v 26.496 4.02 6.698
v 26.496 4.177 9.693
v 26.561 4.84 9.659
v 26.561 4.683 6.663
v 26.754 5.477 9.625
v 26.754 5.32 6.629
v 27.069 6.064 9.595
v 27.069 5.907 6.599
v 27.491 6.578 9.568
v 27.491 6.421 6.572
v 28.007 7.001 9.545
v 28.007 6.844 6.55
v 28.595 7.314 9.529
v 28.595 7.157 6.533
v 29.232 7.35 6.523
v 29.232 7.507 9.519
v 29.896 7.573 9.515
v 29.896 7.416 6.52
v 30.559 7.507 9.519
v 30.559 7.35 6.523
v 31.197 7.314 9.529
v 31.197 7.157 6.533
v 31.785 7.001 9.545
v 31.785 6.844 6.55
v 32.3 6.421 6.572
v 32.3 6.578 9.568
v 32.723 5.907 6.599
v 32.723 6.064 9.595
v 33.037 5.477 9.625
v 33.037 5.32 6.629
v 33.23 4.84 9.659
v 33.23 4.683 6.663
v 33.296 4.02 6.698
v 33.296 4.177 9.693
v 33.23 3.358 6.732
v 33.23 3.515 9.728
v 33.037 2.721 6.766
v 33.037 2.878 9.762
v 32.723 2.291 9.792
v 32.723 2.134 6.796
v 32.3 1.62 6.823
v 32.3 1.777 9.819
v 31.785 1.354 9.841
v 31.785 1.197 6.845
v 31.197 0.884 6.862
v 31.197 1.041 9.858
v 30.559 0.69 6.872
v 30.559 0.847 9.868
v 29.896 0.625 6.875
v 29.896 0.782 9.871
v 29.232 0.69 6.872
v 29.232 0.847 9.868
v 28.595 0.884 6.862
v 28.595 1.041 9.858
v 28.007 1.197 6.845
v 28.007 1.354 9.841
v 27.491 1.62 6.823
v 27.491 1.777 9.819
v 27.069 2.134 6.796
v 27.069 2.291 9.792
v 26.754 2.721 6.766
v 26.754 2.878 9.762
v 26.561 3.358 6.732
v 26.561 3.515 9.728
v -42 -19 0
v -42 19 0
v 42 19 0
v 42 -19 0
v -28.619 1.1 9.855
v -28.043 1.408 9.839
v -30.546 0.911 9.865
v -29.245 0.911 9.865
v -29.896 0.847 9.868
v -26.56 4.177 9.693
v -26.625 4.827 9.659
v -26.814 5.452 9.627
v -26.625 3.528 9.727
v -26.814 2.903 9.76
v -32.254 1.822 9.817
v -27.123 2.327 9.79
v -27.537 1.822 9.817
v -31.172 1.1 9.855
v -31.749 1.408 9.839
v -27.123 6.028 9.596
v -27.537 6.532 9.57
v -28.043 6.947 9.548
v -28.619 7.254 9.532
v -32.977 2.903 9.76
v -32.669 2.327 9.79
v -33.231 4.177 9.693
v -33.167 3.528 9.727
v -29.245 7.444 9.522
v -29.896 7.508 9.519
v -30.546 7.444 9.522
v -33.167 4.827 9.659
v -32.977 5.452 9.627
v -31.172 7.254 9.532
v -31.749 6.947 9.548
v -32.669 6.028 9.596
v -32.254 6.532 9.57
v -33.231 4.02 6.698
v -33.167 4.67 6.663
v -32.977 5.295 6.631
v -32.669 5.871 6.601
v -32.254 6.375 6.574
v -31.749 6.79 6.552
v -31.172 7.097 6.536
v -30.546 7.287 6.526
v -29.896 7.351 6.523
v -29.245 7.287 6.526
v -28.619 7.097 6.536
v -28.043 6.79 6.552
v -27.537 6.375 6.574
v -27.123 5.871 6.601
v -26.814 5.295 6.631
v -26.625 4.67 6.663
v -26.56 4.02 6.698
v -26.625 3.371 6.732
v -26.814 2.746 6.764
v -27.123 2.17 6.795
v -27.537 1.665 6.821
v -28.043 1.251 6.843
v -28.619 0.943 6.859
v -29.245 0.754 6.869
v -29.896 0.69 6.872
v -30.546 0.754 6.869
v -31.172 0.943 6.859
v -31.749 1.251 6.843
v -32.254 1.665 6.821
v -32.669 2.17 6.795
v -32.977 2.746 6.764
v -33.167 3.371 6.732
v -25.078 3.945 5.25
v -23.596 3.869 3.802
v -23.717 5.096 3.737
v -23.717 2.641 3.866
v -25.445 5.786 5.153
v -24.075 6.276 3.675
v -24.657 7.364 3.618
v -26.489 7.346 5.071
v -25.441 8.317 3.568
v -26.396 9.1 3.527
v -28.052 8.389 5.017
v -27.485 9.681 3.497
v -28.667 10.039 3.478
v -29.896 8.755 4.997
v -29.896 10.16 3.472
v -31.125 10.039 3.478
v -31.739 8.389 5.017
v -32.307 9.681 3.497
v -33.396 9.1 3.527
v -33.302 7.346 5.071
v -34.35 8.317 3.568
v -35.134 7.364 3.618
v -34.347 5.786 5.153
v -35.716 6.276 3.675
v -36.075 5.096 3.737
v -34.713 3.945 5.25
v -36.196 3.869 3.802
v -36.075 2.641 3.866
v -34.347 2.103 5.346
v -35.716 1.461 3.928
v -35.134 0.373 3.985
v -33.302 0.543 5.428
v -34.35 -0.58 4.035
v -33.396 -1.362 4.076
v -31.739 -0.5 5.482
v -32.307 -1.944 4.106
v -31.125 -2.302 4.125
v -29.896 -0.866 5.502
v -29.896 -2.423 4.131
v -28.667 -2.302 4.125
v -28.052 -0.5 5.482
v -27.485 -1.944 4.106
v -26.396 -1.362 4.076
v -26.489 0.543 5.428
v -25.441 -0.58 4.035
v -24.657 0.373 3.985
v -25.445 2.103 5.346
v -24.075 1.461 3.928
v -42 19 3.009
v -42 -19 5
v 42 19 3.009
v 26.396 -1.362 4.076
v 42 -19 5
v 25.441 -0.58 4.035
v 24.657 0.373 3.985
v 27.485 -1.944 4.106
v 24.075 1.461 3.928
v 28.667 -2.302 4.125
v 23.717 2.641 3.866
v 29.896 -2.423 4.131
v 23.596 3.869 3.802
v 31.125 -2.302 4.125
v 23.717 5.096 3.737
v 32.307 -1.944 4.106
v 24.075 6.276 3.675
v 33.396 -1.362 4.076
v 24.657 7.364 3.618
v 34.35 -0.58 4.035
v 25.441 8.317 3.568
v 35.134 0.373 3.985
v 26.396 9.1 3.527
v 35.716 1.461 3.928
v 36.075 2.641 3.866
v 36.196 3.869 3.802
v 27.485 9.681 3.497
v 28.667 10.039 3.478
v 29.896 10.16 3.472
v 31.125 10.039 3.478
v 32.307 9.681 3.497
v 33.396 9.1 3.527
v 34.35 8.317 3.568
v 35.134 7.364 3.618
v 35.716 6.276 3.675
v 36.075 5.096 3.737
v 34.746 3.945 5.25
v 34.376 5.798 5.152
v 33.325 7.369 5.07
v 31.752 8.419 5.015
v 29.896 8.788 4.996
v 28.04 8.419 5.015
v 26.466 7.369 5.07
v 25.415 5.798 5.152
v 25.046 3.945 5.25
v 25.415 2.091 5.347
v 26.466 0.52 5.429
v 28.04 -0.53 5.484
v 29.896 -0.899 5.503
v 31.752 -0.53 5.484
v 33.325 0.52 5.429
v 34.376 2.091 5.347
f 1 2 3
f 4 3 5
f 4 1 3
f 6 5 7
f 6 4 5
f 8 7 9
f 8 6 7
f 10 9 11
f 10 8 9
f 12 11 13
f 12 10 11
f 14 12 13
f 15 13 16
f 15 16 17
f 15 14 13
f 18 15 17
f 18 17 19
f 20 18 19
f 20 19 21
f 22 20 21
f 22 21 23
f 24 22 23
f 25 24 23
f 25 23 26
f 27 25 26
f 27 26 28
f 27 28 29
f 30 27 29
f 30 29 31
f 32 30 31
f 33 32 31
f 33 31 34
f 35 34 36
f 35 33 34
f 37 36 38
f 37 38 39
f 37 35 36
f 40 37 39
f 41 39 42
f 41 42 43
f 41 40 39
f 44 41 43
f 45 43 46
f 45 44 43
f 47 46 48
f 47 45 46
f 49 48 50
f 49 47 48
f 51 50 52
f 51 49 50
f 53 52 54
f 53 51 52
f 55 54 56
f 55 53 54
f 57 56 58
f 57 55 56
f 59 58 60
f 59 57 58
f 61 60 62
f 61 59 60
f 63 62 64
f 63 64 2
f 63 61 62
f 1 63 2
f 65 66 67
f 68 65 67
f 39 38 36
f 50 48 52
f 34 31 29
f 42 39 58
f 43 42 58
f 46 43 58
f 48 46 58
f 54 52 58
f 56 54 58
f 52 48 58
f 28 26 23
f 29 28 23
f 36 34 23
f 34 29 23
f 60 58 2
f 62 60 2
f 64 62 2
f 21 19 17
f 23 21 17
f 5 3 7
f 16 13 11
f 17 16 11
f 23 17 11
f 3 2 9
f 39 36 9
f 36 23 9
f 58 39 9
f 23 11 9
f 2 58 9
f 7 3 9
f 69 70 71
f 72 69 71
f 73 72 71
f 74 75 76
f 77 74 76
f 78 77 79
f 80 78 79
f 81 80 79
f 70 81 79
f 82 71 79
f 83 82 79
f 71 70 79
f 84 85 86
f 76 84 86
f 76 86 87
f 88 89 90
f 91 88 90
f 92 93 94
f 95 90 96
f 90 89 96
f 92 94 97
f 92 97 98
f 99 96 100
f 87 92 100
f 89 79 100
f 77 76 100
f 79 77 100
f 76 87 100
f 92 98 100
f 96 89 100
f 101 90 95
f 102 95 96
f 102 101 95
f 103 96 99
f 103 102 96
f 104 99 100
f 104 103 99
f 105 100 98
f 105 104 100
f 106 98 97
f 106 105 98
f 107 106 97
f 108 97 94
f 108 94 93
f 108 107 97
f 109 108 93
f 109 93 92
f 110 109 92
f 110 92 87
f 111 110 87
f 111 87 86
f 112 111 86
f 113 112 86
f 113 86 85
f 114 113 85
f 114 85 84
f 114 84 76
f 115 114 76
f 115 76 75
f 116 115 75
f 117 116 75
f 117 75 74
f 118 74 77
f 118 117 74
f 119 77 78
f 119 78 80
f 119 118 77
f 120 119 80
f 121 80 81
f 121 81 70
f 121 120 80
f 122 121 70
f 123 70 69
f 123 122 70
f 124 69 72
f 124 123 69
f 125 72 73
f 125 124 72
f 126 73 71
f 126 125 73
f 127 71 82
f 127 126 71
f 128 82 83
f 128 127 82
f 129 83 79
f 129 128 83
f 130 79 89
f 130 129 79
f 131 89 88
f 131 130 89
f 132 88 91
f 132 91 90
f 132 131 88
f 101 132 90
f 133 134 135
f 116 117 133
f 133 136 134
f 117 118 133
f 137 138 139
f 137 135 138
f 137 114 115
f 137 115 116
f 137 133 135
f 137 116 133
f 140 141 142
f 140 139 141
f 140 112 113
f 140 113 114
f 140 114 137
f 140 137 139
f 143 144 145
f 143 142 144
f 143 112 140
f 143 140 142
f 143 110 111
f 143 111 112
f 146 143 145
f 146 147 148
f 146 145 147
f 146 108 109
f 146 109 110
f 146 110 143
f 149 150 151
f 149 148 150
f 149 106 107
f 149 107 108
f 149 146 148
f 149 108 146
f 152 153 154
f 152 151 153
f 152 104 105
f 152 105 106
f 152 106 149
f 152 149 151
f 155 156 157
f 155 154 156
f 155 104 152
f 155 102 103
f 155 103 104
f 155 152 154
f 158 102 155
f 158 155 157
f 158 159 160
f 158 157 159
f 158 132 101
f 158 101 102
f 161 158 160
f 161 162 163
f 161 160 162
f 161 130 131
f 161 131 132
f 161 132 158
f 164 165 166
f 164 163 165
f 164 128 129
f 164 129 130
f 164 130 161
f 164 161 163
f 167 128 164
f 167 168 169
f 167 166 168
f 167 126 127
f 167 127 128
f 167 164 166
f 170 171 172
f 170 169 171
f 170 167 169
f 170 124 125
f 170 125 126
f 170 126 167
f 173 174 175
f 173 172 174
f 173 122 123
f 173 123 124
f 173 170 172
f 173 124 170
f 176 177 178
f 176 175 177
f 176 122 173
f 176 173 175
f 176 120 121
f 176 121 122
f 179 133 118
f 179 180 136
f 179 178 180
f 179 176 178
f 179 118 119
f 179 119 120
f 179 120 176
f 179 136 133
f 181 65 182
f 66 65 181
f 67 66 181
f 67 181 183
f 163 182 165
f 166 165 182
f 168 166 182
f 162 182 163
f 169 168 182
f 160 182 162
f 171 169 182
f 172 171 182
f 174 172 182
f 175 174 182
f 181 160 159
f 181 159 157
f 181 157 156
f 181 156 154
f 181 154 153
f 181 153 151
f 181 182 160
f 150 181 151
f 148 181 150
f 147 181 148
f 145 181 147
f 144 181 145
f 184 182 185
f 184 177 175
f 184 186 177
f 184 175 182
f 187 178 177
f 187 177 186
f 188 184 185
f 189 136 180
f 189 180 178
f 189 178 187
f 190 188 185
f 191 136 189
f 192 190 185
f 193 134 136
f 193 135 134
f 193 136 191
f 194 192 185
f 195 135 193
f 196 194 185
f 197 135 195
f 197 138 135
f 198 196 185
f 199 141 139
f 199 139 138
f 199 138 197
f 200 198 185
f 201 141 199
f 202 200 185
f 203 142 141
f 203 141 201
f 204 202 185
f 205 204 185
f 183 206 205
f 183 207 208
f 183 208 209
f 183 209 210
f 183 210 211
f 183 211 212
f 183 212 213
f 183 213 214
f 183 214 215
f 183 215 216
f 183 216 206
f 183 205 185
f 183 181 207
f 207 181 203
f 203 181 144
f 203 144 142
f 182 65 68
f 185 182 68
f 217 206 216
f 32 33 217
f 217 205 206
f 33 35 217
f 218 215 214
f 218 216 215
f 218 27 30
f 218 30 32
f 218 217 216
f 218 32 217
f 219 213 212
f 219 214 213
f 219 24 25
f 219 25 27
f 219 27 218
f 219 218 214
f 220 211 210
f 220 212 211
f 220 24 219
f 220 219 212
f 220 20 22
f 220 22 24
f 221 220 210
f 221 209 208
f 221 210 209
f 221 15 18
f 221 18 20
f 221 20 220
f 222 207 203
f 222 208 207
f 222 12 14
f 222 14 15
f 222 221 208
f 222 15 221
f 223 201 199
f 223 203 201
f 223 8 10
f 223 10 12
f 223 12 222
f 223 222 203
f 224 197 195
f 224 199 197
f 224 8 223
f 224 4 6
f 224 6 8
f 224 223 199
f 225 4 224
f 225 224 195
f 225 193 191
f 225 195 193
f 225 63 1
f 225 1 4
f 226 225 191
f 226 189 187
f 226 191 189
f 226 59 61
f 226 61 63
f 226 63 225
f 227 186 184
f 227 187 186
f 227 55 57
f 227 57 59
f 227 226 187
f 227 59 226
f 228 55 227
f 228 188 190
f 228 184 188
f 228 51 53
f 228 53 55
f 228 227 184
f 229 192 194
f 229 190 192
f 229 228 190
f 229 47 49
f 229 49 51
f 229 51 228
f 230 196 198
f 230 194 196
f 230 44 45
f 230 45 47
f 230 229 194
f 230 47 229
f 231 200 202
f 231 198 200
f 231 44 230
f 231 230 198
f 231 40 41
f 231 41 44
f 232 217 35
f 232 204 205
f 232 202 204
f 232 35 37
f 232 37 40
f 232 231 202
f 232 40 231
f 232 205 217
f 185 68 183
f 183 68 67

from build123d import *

# Parameters (mm, degrees)
SKETCH1_W           = 84
SKETCH1_H           = 38
BOSS_EXTRUDE1_DEPTH = 5
SKETCH2_W           = 84
SKETCH2_H           = 41.155299277
CUT_REVOLVE1_ANGLE  = 3
SKETCH3_R           = 6.3
SKETCH5_R           = 3.335164517
SKETCH3_4_R         = 6.3
SKETCH5_4_R         = 3.4
SKETCH5_8_R         = 3.335164517
SKETCH5_8_R_2       = 3.4
BOSS_EXTRUDE2_DEPTH = 3


with BuildPart() as part:
    # Sketch1 → Boss-Extrude1 (new body)
    with BuildSketch(Plane.XY):
        Rectangle(SKETCH1_W, SKETCH1_H)
    extrude(amount=BOSS_EXTRUDE1_DEPTH)

    # Sketch2 → Cut-Revolve1 (revolve, cut)
    with BuildSketch(Plane.XY.offset(5)):
        with Locations((0, 1.577649639)):
            Rectangle(SKETCH2_W, SKETCH2_H)
    revolve(axis=Axis((-42, -19, 5), (-1, 0, 0)), revolution_arc=CUT_REVOLVE1_ANGLE, mode=Mode.SUBTRACT)

    # Sketch3 → Loft2 section 0
    with BuildSketch(Plane(origin=(0, 0.209279164, 3.993284337), x_dir=(1, 0, 0), z_dir=(0, 0.052335956, 0.998629535))):
        with Locations((-29.895651858, 3.664359058)):
            Circle(SKETCH3_R)
    # Sketch5 → Loft2 section 1
    with BuildSketch(Plane(origin=(0, 0.361053437, 6.889309988), x_dir=(-1, 0, 0), z_dir=(0, -0.052335956, -0.998629535))):
        with Locations((29.895651858, 3.664359058)):
            Circle(SKETCH5_R)
    loft()

    # Sketch3<4> → Loft3 section 0
    with BuildSketch(Plane(origin=(0, 0.209279164, 3.993284337), x_dir=(1, 0, 0), z_dir=(0, 0.052335956, 0.998629535))):
        with Locations((29.895651858, 3.664359058)):
            Circle(SKETCH3_4_R)
    # Sketch5<4> → Loft3 section 1
    with BuildSketch(Plane(origin=(0, 0.361053437, 6.889309988), x_dir=(-1, 0, 0), z_dir=(0, -0.052335956, -0.998629535))):
        with Locations((-29.895651858, 3.664359058)):
            Circle(SKETCH5_4_R)
    loft()

    # Sketch5<8> → Boss-Extrude2 (add)
    with BuildSketch(Plane(origin=(0, 0.361053437, 6.889309988), x_dir=(-1, 0, 0), z_dir=(0, -0.052335956, -0.998629535))):
        with Locations((29.895651858, 3.664359058)):
            Circle(SKETCH5_8_R)
        with Locations((-29.895651858, 3.664359058)):
            Circle(SKETCH5_8_R_2)
    extrude(amount=-BOSS_EXTRUDE2_DEPTH)


solid = part.part
